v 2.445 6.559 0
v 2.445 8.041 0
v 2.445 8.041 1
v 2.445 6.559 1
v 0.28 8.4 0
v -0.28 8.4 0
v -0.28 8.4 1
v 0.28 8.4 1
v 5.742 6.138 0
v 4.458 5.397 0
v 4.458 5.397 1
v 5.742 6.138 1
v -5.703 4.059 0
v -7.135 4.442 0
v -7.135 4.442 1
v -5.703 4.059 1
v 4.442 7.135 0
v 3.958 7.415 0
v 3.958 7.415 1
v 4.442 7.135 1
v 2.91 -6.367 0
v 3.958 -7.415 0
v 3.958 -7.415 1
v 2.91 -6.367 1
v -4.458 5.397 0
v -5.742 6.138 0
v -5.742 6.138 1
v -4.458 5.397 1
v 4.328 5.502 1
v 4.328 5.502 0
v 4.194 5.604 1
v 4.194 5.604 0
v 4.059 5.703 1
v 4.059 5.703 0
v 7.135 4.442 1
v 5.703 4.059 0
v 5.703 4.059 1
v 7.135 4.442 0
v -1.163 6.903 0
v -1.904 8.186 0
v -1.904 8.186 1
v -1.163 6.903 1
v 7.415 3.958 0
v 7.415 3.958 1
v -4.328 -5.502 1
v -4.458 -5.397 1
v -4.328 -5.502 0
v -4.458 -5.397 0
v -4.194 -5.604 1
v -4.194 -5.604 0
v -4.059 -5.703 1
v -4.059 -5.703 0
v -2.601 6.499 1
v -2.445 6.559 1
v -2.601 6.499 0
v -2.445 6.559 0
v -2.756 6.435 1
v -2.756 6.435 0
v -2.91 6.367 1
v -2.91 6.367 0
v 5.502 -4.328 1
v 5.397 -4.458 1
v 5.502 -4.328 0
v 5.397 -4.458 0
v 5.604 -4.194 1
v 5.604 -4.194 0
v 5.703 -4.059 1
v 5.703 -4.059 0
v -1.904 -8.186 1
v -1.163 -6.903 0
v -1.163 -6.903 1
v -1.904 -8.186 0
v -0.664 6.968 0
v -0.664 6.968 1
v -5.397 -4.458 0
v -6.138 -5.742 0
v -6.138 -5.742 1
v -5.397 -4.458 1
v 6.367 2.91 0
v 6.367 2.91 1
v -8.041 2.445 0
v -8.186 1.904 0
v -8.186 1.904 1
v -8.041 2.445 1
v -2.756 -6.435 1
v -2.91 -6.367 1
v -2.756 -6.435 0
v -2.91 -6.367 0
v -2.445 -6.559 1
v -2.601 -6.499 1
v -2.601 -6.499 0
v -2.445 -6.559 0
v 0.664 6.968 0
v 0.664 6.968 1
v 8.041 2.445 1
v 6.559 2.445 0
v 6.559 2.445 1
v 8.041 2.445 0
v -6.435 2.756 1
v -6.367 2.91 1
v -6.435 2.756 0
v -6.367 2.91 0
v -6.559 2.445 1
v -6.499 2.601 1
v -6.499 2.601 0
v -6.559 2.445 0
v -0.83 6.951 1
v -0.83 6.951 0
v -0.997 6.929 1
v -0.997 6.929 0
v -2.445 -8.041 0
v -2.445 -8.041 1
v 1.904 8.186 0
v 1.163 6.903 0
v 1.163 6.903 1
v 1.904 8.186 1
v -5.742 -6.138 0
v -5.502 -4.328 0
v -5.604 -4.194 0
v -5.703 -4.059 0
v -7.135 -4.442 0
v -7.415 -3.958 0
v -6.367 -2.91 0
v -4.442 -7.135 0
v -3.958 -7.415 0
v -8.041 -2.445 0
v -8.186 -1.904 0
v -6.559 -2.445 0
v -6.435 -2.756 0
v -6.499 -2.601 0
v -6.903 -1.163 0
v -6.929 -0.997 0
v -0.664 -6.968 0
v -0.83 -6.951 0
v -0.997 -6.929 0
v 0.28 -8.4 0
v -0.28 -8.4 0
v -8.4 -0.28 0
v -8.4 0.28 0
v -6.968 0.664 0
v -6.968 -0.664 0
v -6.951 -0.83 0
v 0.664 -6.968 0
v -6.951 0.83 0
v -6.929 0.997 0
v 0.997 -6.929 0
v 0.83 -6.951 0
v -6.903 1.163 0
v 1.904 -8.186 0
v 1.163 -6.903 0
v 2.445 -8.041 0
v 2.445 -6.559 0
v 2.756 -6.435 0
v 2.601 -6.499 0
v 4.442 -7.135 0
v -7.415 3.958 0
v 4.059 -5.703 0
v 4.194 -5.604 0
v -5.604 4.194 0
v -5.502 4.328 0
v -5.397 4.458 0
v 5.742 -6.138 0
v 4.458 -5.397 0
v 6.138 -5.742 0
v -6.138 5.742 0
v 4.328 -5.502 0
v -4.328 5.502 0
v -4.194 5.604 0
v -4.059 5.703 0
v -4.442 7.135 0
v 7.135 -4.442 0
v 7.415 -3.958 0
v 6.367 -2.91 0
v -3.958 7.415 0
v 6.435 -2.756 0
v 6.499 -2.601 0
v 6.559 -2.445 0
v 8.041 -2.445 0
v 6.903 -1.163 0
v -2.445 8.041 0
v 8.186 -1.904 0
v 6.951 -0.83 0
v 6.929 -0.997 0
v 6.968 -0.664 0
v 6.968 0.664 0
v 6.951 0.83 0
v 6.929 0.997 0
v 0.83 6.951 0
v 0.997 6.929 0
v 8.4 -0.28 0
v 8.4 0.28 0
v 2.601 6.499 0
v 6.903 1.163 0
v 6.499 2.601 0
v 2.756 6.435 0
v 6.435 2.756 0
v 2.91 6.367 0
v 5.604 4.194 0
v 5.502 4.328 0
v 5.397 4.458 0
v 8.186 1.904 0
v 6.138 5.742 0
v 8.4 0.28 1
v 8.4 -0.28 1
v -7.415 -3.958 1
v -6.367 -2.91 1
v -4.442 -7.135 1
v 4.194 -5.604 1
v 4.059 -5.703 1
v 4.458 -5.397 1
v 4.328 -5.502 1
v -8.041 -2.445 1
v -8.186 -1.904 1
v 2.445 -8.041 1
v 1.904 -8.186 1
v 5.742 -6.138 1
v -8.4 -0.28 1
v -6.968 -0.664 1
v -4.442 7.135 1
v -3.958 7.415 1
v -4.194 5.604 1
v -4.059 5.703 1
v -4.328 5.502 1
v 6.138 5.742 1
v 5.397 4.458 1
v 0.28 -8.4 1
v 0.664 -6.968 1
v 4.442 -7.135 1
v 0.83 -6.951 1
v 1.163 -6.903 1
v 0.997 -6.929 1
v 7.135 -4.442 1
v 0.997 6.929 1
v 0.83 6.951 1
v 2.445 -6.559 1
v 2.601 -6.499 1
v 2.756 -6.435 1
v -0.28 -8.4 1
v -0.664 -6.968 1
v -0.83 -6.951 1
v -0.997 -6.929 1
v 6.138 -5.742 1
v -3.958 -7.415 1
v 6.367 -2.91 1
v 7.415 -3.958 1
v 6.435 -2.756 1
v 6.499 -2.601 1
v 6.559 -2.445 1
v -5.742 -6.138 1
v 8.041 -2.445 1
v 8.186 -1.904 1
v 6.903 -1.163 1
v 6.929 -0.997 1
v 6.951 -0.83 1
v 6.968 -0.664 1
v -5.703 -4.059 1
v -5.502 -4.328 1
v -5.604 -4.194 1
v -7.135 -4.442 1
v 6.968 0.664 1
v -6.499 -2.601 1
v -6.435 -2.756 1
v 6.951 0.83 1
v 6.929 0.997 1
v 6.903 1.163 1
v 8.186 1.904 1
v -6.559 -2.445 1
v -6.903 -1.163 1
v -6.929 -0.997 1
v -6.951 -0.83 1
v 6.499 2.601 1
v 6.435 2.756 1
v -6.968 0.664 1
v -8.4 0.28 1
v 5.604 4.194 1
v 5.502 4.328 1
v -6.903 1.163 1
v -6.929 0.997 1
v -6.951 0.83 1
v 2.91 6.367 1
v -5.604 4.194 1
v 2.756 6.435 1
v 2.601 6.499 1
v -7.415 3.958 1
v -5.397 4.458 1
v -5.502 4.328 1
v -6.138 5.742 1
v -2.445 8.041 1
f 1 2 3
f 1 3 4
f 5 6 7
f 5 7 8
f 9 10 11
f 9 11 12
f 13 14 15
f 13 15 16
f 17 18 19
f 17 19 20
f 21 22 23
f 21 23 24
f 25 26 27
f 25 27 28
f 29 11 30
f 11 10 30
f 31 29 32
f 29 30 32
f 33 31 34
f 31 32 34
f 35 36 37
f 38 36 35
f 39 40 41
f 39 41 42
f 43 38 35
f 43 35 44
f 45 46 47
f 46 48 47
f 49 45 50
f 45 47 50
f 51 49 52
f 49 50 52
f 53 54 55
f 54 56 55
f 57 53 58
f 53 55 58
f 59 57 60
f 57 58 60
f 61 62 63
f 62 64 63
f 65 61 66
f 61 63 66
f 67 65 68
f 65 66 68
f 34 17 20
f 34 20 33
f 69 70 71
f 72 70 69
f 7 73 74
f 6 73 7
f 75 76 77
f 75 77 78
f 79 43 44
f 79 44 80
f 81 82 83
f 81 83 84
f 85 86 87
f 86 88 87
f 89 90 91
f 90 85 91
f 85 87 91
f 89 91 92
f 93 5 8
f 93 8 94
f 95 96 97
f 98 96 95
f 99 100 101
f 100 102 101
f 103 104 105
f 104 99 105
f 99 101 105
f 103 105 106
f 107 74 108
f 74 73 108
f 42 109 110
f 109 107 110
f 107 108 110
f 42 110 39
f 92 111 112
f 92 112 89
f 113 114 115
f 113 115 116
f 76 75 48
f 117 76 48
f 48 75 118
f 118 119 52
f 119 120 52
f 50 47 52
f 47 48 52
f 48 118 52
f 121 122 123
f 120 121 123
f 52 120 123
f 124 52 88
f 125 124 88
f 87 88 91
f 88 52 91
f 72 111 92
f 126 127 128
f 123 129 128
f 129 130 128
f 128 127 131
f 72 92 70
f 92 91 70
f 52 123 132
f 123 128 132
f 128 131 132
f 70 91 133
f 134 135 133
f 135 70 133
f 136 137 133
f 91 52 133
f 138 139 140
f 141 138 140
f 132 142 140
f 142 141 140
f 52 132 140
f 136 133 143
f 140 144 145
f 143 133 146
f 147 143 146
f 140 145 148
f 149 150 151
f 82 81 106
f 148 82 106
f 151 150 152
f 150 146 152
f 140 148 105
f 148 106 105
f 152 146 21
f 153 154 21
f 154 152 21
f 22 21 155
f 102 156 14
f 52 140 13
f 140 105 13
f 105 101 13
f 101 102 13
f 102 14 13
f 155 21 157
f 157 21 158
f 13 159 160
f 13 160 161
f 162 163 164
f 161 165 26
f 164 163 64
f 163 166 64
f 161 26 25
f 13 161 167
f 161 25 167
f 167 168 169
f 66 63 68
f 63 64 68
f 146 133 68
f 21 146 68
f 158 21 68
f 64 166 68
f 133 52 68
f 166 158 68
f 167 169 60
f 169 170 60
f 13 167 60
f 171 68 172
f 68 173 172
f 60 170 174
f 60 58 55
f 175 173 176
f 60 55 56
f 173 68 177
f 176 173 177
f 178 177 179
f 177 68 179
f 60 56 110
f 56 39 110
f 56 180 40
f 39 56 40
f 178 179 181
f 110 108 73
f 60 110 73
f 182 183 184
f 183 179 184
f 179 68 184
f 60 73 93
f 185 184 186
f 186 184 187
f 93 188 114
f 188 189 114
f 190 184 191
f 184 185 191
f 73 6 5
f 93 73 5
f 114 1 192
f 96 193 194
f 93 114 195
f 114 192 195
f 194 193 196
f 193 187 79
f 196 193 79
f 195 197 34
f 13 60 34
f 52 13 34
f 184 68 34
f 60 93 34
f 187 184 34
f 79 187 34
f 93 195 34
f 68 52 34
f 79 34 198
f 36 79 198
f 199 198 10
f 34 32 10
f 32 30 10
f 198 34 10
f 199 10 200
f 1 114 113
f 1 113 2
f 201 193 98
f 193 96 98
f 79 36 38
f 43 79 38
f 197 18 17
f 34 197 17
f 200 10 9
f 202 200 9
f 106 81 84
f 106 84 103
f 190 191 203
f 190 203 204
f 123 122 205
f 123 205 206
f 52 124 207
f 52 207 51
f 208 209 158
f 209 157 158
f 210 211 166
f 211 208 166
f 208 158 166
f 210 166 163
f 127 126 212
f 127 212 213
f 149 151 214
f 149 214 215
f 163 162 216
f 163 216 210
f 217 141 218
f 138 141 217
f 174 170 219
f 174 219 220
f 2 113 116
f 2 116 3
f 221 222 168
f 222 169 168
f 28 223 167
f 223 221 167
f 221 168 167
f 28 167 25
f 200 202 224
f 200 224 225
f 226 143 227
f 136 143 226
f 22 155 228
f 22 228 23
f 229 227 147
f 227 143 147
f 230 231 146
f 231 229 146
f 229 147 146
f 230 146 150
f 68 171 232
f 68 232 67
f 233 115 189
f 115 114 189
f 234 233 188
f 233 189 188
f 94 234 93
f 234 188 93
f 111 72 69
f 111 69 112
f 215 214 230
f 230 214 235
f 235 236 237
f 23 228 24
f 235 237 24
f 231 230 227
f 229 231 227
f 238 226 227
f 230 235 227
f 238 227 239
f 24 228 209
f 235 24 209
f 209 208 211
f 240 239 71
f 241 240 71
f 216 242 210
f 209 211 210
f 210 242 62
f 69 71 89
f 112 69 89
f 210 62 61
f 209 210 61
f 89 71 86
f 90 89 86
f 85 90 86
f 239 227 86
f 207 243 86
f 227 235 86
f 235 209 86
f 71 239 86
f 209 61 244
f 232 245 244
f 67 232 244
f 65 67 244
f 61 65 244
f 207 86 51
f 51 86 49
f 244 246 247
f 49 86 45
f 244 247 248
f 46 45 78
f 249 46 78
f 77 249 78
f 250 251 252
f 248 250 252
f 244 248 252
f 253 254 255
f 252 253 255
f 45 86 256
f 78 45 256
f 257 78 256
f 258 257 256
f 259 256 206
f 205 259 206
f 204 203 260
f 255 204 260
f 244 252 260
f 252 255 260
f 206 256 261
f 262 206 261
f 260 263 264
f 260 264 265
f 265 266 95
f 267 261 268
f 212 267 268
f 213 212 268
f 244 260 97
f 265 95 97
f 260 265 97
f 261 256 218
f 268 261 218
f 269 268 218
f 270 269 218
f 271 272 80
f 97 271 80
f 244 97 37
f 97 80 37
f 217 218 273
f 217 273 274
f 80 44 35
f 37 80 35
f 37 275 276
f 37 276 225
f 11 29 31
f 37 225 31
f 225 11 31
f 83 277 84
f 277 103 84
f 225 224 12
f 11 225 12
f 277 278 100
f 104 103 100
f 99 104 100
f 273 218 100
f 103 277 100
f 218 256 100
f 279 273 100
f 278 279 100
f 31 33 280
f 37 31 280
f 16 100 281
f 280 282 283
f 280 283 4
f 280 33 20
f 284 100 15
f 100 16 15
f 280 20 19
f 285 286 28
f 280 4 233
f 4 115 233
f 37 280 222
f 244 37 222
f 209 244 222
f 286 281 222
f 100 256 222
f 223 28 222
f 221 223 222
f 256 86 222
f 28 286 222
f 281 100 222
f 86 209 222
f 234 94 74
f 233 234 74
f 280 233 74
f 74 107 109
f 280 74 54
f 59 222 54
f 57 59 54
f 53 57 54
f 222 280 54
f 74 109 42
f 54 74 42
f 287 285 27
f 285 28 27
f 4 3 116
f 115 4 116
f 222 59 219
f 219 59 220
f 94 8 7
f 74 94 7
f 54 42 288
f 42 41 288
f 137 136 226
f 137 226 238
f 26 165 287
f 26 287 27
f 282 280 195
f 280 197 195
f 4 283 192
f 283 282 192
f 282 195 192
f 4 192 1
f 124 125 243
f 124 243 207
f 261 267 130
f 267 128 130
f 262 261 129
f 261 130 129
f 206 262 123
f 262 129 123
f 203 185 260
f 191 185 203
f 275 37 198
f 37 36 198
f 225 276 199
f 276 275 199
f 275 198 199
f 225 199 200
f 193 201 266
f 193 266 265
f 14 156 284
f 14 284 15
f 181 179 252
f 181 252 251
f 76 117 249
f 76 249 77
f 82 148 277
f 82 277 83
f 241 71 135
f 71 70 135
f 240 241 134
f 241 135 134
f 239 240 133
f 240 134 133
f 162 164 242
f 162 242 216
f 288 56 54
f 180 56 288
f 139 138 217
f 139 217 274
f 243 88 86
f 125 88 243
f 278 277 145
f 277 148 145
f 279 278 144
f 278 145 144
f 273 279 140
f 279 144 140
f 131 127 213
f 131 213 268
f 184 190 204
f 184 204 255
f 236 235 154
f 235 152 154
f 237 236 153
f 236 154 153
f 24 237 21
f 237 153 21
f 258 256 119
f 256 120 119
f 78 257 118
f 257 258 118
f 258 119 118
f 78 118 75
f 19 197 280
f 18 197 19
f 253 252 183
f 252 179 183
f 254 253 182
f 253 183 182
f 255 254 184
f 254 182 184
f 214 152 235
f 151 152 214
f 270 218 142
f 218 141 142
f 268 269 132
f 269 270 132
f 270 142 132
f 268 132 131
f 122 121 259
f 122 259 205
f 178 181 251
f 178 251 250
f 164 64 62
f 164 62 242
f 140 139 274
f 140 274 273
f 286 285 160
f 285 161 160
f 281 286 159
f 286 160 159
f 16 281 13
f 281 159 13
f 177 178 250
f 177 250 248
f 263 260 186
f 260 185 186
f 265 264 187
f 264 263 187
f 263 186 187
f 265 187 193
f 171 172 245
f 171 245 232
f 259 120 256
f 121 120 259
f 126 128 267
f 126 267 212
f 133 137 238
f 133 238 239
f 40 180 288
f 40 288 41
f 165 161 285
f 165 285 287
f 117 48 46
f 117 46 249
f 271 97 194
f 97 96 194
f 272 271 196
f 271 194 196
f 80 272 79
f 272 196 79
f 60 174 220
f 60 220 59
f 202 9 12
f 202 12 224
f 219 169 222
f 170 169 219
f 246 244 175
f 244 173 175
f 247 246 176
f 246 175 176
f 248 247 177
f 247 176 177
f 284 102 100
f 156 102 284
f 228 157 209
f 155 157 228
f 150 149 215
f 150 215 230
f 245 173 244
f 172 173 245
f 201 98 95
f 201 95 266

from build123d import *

# Parameters (mm, degrees)
SKETCH1_R           = 7
BOSS_EXTRUDE1_DEPTH = 1
BOSS_EXTRUDE2_DEPTH = 1
CIRPATTERN1_COUNT   = 24


with BuildPart() as part:
    # Sketch1 → Boss-Extrude1 (new body)
    with BuildSketch(Plane.XY):
        Circle(SKETCH1_R)
    extrude(amount=BOSS_EXTRUDE1_DEPTH)

    # Sketch2 → Boss-Extrude2 (add)
    with BuildSketch(Plane.XY):
        Polygon((0, 6.72), (-0.730154643, 6.72), (-0.28, 8.4), (0.28, 8.4), (0.730154643, 6.72), align=None)
    boss_extrude2 = extrude(amount=BOSS_EXTRUDE2_DEPTH)

    # CirPattern1: Boss-Extrude2 ×24 about axis
    cirpattern1_axis = Axis((0, 0, 0), (0, 0, 1))
    for i in range(1, CIRPATTERN1_COUNT):
        add(boss_extrude2.rotate(cirpattern1_axis, i * 360 / CIRPATTERN1_COUNT))


solid = part.part
